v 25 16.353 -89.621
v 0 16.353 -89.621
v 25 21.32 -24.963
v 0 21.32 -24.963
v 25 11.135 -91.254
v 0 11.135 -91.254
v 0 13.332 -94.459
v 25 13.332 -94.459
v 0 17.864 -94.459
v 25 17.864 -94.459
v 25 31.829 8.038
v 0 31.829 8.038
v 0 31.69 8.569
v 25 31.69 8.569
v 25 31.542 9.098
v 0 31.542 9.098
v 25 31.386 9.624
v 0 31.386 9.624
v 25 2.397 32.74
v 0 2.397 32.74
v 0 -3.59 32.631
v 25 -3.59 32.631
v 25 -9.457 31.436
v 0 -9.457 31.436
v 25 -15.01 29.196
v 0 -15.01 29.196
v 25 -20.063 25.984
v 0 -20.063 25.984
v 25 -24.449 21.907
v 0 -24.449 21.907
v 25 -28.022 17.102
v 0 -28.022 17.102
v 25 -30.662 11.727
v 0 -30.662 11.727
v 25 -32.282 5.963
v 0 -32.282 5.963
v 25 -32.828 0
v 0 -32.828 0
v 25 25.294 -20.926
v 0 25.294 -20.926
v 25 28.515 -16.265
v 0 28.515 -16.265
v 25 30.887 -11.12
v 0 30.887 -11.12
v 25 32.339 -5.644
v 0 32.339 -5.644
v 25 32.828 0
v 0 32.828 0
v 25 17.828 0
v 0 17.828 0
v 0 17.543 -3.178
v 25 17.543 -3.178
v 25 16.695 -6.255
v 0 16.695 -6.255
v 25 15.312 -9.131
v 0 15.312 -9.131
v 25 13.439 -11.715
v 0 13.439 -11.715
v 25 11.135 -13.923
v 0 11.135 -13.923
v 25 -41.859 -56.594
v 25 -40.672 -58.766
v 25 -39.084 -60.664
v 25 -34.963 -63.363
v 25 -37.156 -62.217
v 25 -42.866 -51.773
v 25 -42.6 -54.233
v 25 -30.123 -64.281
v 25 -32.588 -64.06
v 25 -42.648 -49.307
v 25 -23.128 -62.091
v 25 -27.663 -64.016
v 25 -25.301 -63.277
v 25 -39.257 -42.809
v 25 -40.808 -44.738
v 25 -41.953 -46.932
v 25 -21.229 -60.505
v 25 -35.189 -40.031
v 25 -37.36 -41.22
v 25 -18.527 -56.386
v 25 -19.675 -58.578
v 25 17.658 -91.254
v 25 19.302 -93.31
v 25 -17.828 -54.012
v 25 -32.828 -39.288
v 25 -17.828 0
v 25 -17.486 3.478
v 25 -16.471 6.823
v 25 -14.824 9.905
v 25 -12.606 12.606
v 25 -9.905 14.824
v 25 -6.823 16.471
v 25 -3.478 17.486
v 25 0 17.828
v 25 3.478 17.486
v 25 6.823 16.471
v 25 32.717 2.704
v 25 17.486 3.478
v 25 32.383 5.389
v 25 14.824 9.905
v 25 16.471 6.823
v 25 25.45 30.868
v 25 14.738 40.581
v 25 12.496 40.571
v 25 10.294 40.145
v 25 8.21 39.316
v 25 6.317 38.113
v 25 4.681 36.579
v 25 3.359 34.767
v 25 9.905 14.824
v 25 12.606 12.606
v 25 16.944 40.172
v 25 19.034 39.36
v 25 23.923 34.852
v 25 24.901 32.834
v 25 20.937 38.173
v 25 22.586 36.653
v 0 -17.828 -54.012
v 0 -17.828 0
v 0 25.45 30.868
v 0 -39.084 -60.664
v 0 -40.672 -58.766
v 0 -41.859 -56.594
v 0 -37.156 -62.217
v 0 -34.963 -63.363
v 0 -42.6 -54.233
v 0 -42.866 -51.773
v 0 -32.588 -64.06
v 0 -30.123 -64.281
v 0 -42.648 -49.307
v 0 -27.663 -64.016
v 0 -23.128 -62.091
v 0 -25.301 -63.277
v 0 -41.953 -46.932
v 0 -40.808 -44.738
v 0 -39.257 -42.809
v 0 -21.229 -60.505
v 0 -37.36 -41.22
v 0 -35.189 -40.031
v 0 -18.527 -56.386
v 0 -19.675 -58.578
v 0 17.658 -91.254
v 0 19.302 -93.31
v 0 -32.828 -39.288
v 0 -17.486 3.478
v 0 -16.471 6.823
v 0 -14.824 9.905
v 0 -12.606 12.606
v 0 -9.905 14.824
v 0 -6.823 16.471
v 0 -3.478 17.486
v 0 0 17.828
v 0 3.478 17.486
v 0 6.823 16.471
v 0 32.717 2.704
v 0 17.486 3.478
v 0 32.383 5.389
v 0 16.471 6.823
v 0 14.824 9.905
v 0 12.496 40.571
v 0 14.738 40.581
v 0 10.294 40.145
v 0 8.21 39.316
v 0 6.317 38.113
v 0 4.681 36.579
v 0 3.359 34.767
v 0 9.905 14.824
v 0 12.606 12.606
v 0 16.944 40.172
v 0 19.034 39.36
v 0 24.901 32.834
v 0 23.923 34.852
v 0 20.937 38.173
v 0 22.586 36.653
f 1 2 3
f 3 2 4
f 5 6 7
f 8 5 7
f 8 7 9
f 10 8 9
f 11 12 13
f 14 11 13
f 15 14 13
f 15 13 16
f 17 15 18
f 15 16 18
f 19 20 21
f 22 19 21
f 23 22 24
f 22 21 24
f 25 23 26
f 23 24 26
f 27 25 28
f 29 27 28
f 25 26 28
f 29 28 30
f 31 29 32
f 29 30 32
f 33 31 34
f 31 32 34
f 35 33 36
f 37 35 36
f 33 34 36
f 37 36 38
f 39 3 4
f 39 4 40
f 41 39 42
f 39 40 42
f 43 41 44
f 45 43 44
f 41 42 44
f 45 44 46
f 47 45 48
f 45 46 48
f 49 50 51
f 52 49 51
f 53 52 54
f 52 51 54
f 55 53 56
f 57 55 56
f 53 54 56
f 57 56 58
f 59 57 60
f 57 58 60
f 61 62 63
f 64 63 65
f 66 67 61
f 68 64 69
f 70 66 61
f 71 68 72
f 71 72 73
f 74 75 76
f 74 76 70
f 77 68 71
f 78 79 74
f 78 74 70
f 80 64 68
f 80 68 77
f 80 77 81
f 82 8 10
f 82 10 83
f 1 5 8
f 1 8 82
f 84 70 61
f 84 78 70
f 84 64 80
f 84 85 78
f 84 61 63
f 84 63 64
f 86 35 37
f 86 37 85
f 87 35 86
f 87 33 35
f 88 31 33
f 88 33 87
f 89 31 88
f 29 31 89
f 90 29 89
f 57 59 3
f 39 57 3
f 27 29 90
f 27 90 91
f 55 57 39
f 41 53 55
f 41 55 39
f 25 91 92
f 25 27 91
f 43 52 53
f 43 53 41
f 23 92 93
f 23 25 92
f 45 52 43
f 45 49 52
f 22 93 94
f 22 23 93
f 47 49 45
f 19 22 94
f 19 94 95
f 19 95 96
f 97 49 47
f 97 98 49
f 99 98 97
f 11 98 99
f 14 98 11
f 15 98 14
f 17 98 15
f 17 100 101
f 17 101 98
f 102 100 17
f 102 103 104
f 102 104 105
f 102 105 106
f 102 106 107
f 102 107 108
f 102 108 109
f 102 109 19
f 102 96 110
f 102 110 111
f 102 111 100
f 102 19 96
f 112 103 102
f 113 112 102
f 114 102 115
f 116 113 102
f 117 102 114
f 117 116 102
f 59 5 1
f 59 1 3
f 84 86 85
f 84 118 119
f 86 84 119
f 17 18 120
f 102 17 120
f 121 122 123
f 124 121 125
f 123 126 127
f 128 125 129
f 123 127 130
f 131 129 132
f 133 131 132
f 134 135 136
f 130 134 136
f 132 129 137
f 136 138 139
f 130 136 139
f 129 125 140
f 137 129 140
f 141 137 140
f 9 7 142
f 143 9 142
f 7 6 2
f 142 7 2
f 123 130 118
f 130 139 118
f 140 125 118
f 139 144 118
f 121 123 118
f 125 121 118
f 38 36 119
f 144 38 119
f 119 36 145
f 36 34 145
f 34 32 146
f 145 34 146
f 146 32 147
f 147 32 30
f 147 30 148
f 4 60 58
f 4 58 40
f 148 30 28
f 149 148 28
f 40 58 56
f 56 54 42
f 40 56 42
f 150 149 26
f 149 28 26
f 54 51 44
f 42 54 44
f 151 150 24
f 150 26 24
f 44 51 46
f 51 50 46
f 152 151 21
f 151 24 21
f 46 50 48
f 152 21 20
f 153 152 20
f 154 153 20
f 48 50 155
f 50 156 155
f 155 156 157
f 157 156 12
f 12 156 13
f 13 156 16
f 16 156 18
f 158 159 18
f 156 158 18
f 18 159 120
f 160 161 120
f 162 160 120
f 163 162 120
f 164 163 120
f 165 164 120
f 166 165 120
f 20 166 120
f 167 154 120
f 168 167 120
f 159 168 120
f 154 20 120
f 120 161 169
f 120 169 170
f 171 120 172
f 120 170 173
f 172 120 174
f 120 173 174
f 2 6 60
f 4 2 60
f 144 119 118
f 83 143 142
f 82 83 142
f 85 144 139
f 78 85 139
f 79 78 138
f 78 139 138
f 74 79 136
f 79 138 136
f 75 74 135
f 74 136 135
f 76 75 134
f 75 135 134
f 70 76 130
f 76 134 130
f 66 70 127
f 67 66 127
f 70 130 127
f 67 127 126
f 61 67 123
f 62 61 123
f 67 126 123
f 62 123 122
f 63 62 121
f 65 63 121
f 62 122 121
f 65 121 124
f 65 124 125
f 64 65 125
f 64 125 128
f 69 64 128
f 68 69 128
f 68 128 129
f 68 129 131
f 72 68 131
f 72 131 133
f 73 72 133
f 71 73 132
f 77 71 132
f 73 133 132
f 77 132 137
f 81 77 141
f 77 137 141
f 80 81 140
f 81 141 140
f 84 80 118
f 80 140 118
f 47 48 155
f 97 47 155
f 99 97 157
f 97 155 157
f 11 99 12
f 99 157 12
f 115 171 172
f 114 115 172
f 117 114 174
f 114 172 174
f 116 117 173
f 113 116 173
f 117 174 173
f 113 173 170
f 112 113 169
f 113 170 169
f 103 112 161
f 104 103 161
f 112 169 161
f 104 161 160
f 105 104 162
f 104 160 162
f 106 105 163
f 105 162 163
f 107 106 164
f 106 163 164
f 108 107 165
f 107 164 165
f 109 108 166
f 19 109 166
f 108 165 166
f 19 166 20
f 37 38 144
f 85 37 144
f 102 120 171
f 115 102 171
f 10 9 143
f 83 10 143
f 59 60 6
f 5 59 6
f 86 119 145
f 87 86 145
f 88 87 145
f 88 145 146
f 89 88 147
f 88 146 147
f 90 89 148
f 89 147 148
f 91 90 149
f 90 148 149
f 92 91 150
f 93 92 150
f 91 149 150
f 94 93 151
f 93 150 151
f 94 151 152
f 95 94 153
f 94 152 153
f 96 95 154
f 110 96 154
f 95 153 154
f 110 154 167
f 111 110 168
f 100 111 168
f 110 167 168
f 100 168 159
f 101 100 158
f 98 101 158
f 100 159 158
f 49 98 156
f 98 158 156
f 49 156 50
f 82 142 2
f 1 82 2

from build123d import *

# Parameters (mm, degrees)
F1_DEPTH = 25


# Not quite as in the source:
# - a feature names something its author has since deleted; it is built from what else it names


with BuildPart() as f1:
    # F0 (on Right) → F1 (new body)
    with BuildSketch(Plane.YZ):
        with BuildLine():
            Line((21.3200338185, 0), (17.8281293297, 0))
            ThreePointArc((17.8281293297, 0), (16.0680734174, -7.7239376), (11.135423556, -13.9228063846))
            Line((11.135423556, -13.9228063846), (11.135423556, -30.8818460833))
            ThreePointArc((11.135423556, -30.8818460833), (16.4953904054, -28.3828851715), (21.3200338185, -24.9628170138))
            Line((21.3200338185, -24.9628170138), (21.3200338185, 0))
        make_face()
        with BuildLine():
            ThreePointArc((-17.8281293297, 0), (0, 17.8281293297), (17.8281293297, 0))
            Line((17.8281293297, 0), (21.3200338185, 0))
            Line((21.3200338185, 0), (21.3200338185, -24.9628170138))
            ThreePointArc((21.3200338185, -24.9628170138), (29.8126055788, -13.7438940584), (32.8281293297, 0))
            ThreePointArc((32.8281293297, 0), (32.5773816899, 4.0497256101), (31.8289692891, 8.0375860357))
            Line((31.8289692891, 8.0375860357), (31.3856816717, 9.6241914615))
            ThreePointArc((31.3856816717, 9.6241914615), (28.3999929291, 16.4659186477), (23.9458348633, 22.4562478608))
            ThreePointArc((23.9458348633, 22.4562478608), (8.5005350475, 17.8111454186), (2.3973170077, 32.7404787144))
            ThreePointArc((2.3973170077, 32.7404787144), (-22.3493472221, 24.0456389815), (-32.8281293297, 0))
            Line((-32.8281293297, 0), (-17.8281293297, 0))
        make_face()
        with BuildLine():
            Line((-17.8281293297, -27.5652658229), (-17.8281293297, 0))
            Line((-17.8281293297, 0), (-32.8281293297, 0))
            ThreePointArc((-32.8281293297, 0), (-28.8353100436, -15.6911111771), (-17.8281293297, -27.5652658229))
        make_face()
        with BuildLine():
            Line((-17.8281293297, -49.2888468657), (-17.8281293297, -27.5652658229))
            ThreePointArc((-17.8281293297, -27.5652658229), (-28.8353100436, -15.6911111771), (-32.8281293297, 0))
            Line((-32.8281293297, 0), (-32.8281293297, -39.2883635356))
            ThreePointArc((-32.8281293297, -39.2883635356), (-23.2296585262, -41.1410511261), (-17.8281293297, -49.2888468657))
        make_face()
        with BuildLine():
            ThreePointArc((21.3200338185, -24.9628170138), (16.4953904054, -28.3828851715), (11.135423556, -30.8818460833))
            Line((11.135423556, -30.8818460833), (11.135423556, -91.2536308169))
            Line((11.135423556, -91.2536308169), (16.2277286872, -91.2536308169))
            Line((16.2277286872, -91.2536308169), (16.3531204545, -89.621300844))
            Line((16.3531204545, -89.621300844), (21.3200338185, -24.9628170138))
        make_face()
        with BuildLine():
            Line((-17.8281293297, -49.3592731655), (-17.8281293297, -49.2888468657))
            ThreePointArc((-17.8281293297, -49.2888468657), (-23.2296585262, -41.1410511261), (-32.8281293297, -39.2883635356))
            Line((-32.8281293297, -39.2883635356), (-32.8281293297, -49.3592731655))
            Line((-32.8281293297, -49.3592731655), (-17.8281293297, -49.3592731655))
        make_face()
        with BuildLine():
            ThreePointArc((24.9010812958, 32.8337324859), (13.6167044371, 40.6286479576), (2.3973170077, 32.7404787144))
            ThreePointArc((2.3973170077, 32.7404787144), (14.1397228999, 29.626918699), (23.9458348633, 22.4562478608))
            ThreePointArc((23.9458348633, 22.4562478608), (25.2235009878, 25.4290316666), (25.6599794461, 28.6351758987))
            ThreePointArc((25.6599794461, 28.6351758987), (25.6074521104, 29.7564349958), (25.4503302031, 30.867872709))
            Line((25.4503302031, 30.867872709), (24.9010812958, 32.8337324859))
        make_face()
        with BuildLine():
            ThreePointArc((23.9458348633, 22.4562478608), (14.1397228999, 29.626918699), (2.3973170077, 32.7404787144))
            ThreePointArc((2.3973170077, 32.7404787144), (8.5005350475, 17.8111454186), (23.9458348633, 22.4562478608))
        make_face()
        with BuildLine():
            Line((-32.8281293297, -49.3592731655), (-32.8281293297, -39.2883635356))
            ThreePointArc((-32.8281293297, -39.2883635356), (-39.0840214493, -60.6643501174), (-17.8281293297, -54.0118288841))
            Line((-17.8281293297, -54.0118288841), (-17.8281293297, -49.3592731655))
            Line((-17.8281293297, -49.3592731655), (-32.8281293297, -49.3592731655))
        make_face()
        Polygon((16.2277286872, -91.2536308169), (11.135423556, -91.2536308169), (13.3315734565, -94.4593122868), (17.8637079006, -94.4593122868), (19.3015802652, -93.3099836111), (17.6578841403, -91.2536308169), align=None)
        Polygon((17.6578841403, -91.2536308169), (16.3531204545, -89.621300844), (16.2277286872, -91.2536308169), align=None)
        with BuildLine():
            ThreePointArc((25.6599794461, 28.6351758987), (25.2235009878, 25.4290316666), (23.9458348633, 22.4562478608))
            ThreePointArc((23.9458348633, 22.4562478608), (28.3999929291, 16.4659186477), (31.3856816717, 9.6241914615))
            Line((31.3856816717, 9.6241914615), (25.4503302031, 30.867872709))
            ThreePointArc((25.4503302031, 30.867872709), (25.6074521104, 29.7564349958), (25.6599794461, 28.6351758987))
        make_face()
        with BuildLine():
            Line((31.3856816717, 9.6241914615), (31.8289692891, 8.0375860357))
            ThreePointArc((31.8289692891, 8.0375860357), (31.6172793456, 8.8336697962), (31.3856816717, 9.6241914615))
        make_face()
    extrude(amount=F1_DEPTH)


solid = f1.part
